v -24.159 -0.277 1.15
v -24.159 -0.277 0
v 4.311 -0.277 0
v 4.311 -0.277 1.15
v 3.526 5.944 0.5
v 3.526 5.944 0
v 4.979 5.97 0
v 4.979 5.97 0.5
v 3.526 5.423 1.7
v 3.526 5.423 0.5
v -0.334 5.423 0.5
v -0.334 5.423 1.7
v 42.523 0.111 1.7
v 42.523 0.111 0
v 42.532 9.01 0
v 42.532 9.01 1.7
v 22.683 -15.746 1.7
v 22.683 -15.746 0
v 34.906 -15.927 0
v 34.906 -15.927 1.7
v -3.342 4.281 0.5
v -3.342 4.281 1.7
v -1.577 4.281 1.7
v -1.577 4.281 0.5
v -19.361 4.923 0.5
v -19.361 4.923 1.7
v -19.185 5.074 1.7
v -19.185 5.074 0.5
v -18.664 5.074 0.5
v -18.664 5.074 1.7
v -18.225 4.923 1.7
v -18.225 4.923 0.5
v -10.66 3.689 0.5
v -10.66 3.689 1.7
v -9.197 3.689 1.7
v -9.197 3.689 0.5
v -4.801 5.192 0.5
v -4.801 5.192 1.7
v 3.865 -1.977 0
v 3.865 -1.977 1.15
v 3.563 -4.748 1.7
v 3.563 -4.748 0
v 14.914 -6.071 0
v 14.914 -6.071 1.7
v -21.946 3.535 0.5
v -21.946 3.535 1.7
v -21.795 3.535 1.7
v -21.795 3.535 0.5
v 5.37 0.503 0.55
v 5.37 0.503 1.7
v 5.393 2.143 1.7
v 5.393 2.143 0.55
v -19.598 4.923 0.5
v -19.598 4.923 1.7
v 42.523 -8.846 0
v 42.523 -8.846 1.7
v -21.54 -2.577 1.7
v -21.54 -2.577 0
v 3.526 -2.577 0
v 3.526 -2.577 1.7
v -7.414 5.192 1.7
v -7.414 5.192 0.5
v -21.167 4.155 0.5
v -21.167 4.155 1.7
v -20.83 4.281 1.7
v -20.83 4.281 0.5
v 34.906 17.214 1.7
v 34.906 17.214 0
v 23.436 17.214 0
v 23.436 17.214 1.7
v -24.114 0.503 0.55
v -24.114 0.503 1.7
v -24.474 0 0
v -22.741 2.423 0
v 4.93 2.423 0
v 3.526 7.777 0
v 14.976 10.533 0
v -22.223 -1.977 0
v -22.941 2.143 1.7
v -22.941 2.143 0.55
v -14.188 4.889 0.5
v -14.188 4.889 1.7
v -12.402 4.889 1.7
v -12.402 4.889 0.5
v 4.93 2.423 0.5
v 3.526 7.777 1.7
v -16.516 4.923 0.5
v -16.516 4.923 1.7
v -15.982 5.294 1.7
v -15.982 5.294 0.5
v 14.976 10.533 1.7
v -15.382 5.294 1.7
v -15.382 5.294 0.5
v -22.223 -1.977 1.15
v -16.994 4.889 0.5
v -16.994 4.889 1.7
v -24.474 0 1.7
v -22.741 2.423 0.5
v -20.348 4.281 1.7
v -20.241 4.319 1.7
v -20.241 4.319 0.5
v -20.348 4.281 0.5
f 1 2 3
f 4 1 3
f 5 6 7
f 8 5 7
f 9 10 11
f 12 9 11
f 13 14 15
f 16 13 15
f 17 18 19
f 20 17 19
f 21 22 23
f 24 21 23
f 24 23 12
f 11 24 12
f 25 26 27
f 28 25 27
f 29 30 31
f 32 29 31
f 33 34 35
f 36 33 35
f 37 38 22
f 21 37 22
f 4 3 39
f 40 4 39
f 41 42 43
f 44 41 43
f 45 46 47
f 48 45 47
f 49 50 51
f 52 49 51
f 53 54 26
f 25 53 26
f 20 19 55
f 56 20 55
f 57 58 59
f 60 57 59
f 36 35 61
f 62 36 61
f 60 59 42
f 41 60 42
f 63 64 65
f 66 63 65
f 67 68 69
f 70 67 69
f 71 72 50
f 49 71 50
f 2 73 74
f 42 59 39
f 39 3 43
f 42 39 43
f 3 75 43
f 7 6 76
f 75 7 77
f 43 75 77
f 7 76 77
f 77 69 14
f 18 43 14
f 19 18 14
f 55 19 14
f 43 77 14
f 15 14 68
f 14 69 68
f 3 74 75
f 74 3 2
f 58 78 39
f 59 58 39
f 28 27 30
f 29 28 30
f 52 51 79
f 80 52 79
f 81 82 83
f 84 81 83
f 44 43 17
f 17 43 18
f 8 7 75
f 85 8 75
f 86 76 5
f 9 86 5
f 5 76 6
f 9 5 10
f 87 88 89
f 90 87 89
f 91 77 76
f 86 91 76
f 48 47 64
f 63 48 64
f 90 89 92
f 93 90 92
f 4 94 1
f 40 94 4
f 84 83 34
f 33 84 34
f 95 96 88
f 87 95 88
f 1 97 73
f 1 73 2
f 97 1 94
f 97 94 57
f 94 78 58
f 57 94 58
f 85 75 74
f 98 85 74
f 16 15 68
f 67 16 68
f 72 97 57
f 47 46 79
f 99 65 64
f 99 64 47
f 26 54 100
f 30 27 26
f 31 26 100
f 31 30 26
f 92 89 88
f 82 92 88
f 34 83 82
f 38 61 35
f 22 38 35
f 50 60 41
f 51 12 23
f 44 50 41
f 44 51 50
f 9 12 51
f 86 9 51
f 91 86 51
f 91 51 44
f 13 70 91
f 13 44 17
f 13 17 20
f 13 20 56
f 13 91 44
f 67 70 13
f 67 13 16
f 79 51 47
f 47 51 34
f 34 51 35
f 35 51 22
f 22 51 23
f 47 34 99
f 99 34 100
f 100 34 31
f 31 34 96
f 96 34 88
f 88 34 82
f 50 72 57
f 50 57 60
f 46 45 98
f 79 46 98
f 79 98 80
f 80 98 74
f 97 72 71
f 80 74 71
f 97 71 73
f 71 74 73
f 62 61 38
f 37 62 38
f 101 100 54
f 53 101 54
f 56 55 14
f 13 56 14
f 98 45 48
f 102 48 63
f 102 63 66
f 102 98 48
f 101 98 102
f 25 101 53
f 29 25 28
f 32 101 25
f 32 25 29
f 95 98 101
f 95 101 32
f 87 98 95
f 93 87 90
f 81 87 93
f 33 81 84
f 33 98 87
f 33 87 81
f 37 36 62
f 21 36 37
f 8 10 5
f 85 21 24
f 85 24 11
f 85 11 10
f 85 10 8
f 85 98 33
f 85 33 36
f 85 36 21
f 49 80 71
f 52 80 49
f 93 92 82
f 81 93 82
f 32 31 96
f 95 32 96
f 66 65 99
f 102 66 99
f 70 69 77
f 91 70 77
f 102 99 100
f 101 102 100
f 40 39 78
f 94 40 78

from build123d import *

# Parameters (mm, degrees)
F1_DEPTH = 1.7
F3_DEPTH = 1.15
F5_DEPTH = 1.15
F7_DEPTH = 25
F9_DEPTH = 0.5


with BuildPart() as f1:
    # F0 (on Top) → F1 (new body)
    with BuildSketch(Plane.XY):
        Polygon((3.5258802325, 7.7773156599), (3.5258802325, 5.4234246183), (-20.5959625565, 5.4234246183), (-24.4741197675, 0), (-21.5398941726, -2.5765753817), (3.5258802325, -2.5765753817), (3.563464143, -4.7479634116), (14.9142147576, -6.0714449676), (22.6833798525, -15.7455861511), (34.9059272557, -15.9271247482), (42.5230842084, -8.8459979743), (42.5230842084, 0.111364905), (42.5323378295, 9.0101445094), (34.9059272557, 17.2138623893), (23.4355190769, 17.2138623893), (14.9758500308, 10.5328802019), align=None)
    extrude(amount=F1_DEPTH)

    # F2 (on face) → F3 (cut)
    with BuildSketch(Plane(origin=(0, 0, 0), x_dir=(1, 0, 0), z_dir=(0, 0, -1))):
        Polygon((-24.1591534096, 0.2765753817), (4.3114135042, 0.2765753817), (3.8650040515, 1.9765753817), (-22.2231791909, 1.9765753817), align=None)
        Polygon((-26.6171693802, 0.2765753817), (-24.1591534096, 0.2765753817), (-22.2231791909, 1.9765753817), (-25.9880051017, 1.9765753817), align=None)
    extrude(amount=-F3_DEPTH, mode=Mode.SUBTRACT)

    # F4 (on face) → F5 (cut)
    with BuildSketch(Plane.XY.offset(1.7)):
        Polygon((5.3927684203, 2.1434246183), (-25.6233029068, 2.1434246183), (-26.0389186442, 0.5034246183), (5.3698872216, 0.5034246183), align=None)
    extrude(amount=-F5_DEPTH, mode=Mode.SUBTRACT)

    # F6 (on face) → F7 (cut)
    with BuildSketch(Plane.XY.offset(1.7)):
        Polygon((-5.3833839484, 6.7872931249), (-0.3340959956, 5.4234246183), (0, 7.7773156599), (-22.1384502947, 7.9461717978), (-23.2389890977, 4.8430952587), (-21.9463394889, 3.5349845421), (-20.9003388882, 6.0035409406), align=None)
        Polygon((-1.5771881219, 4.2808800936), (-0.3340959956, 5.4234246183), (-20.5959625565, 5.4234246183), (-21.9463394889, 3.5349845421), (-21.7945538461, 3.5349845421), (-21.1666878313, 4.1554295458), (-20.8302091438, 4.2808800936), (-20.3477170239, 4.2808800936), (-20.2410556376, 4.3186801486), (-19.5979364216, 4.9228575081), (-19.3608161062, 4.9228575081), (-19.184730947, 5.074087996), (-18.6641020609, 5.074087996), (-18.2254650205, 4.9228575081), (-16.9939434519, 4.8885419965), (-16.5155499687, 4.9228575081), (-15.9821361303, 5.2939280868), (-15.3820421547, 5.2939280868), (-14.1877273184, 4.8885419965), (-12.4018825591, 4.8885419965), (-10.6601839463, 3.6888930481), (-9.1968299821, 3.6888930481), (-7.4136951007, 5.1924162544), (-4.8006242141, 5.1924162544), (-3.3421660773, 4.2808800936), align=None)
    extrude(amount=-F7_DEPTH, mode=Mode.SUBTRACT)

    # F8 (on face) → F9 (cut)
    with BuildSketch(Plane(origin=(0, 0, 0), x_dir=(1, 0, 0), z_dir=(0, 0, -1))):
        Polygon((4.9785347655, -5.9697870165), (4.9301558991, -2.4234246183), (-25.2411490917, -2.4234246183), (-25.5858246237, -5.4234246183), align=None)
    extrude(amount=-F9_DEPTH, mode=Mode.SUBTRACT)


solid = f1.part
